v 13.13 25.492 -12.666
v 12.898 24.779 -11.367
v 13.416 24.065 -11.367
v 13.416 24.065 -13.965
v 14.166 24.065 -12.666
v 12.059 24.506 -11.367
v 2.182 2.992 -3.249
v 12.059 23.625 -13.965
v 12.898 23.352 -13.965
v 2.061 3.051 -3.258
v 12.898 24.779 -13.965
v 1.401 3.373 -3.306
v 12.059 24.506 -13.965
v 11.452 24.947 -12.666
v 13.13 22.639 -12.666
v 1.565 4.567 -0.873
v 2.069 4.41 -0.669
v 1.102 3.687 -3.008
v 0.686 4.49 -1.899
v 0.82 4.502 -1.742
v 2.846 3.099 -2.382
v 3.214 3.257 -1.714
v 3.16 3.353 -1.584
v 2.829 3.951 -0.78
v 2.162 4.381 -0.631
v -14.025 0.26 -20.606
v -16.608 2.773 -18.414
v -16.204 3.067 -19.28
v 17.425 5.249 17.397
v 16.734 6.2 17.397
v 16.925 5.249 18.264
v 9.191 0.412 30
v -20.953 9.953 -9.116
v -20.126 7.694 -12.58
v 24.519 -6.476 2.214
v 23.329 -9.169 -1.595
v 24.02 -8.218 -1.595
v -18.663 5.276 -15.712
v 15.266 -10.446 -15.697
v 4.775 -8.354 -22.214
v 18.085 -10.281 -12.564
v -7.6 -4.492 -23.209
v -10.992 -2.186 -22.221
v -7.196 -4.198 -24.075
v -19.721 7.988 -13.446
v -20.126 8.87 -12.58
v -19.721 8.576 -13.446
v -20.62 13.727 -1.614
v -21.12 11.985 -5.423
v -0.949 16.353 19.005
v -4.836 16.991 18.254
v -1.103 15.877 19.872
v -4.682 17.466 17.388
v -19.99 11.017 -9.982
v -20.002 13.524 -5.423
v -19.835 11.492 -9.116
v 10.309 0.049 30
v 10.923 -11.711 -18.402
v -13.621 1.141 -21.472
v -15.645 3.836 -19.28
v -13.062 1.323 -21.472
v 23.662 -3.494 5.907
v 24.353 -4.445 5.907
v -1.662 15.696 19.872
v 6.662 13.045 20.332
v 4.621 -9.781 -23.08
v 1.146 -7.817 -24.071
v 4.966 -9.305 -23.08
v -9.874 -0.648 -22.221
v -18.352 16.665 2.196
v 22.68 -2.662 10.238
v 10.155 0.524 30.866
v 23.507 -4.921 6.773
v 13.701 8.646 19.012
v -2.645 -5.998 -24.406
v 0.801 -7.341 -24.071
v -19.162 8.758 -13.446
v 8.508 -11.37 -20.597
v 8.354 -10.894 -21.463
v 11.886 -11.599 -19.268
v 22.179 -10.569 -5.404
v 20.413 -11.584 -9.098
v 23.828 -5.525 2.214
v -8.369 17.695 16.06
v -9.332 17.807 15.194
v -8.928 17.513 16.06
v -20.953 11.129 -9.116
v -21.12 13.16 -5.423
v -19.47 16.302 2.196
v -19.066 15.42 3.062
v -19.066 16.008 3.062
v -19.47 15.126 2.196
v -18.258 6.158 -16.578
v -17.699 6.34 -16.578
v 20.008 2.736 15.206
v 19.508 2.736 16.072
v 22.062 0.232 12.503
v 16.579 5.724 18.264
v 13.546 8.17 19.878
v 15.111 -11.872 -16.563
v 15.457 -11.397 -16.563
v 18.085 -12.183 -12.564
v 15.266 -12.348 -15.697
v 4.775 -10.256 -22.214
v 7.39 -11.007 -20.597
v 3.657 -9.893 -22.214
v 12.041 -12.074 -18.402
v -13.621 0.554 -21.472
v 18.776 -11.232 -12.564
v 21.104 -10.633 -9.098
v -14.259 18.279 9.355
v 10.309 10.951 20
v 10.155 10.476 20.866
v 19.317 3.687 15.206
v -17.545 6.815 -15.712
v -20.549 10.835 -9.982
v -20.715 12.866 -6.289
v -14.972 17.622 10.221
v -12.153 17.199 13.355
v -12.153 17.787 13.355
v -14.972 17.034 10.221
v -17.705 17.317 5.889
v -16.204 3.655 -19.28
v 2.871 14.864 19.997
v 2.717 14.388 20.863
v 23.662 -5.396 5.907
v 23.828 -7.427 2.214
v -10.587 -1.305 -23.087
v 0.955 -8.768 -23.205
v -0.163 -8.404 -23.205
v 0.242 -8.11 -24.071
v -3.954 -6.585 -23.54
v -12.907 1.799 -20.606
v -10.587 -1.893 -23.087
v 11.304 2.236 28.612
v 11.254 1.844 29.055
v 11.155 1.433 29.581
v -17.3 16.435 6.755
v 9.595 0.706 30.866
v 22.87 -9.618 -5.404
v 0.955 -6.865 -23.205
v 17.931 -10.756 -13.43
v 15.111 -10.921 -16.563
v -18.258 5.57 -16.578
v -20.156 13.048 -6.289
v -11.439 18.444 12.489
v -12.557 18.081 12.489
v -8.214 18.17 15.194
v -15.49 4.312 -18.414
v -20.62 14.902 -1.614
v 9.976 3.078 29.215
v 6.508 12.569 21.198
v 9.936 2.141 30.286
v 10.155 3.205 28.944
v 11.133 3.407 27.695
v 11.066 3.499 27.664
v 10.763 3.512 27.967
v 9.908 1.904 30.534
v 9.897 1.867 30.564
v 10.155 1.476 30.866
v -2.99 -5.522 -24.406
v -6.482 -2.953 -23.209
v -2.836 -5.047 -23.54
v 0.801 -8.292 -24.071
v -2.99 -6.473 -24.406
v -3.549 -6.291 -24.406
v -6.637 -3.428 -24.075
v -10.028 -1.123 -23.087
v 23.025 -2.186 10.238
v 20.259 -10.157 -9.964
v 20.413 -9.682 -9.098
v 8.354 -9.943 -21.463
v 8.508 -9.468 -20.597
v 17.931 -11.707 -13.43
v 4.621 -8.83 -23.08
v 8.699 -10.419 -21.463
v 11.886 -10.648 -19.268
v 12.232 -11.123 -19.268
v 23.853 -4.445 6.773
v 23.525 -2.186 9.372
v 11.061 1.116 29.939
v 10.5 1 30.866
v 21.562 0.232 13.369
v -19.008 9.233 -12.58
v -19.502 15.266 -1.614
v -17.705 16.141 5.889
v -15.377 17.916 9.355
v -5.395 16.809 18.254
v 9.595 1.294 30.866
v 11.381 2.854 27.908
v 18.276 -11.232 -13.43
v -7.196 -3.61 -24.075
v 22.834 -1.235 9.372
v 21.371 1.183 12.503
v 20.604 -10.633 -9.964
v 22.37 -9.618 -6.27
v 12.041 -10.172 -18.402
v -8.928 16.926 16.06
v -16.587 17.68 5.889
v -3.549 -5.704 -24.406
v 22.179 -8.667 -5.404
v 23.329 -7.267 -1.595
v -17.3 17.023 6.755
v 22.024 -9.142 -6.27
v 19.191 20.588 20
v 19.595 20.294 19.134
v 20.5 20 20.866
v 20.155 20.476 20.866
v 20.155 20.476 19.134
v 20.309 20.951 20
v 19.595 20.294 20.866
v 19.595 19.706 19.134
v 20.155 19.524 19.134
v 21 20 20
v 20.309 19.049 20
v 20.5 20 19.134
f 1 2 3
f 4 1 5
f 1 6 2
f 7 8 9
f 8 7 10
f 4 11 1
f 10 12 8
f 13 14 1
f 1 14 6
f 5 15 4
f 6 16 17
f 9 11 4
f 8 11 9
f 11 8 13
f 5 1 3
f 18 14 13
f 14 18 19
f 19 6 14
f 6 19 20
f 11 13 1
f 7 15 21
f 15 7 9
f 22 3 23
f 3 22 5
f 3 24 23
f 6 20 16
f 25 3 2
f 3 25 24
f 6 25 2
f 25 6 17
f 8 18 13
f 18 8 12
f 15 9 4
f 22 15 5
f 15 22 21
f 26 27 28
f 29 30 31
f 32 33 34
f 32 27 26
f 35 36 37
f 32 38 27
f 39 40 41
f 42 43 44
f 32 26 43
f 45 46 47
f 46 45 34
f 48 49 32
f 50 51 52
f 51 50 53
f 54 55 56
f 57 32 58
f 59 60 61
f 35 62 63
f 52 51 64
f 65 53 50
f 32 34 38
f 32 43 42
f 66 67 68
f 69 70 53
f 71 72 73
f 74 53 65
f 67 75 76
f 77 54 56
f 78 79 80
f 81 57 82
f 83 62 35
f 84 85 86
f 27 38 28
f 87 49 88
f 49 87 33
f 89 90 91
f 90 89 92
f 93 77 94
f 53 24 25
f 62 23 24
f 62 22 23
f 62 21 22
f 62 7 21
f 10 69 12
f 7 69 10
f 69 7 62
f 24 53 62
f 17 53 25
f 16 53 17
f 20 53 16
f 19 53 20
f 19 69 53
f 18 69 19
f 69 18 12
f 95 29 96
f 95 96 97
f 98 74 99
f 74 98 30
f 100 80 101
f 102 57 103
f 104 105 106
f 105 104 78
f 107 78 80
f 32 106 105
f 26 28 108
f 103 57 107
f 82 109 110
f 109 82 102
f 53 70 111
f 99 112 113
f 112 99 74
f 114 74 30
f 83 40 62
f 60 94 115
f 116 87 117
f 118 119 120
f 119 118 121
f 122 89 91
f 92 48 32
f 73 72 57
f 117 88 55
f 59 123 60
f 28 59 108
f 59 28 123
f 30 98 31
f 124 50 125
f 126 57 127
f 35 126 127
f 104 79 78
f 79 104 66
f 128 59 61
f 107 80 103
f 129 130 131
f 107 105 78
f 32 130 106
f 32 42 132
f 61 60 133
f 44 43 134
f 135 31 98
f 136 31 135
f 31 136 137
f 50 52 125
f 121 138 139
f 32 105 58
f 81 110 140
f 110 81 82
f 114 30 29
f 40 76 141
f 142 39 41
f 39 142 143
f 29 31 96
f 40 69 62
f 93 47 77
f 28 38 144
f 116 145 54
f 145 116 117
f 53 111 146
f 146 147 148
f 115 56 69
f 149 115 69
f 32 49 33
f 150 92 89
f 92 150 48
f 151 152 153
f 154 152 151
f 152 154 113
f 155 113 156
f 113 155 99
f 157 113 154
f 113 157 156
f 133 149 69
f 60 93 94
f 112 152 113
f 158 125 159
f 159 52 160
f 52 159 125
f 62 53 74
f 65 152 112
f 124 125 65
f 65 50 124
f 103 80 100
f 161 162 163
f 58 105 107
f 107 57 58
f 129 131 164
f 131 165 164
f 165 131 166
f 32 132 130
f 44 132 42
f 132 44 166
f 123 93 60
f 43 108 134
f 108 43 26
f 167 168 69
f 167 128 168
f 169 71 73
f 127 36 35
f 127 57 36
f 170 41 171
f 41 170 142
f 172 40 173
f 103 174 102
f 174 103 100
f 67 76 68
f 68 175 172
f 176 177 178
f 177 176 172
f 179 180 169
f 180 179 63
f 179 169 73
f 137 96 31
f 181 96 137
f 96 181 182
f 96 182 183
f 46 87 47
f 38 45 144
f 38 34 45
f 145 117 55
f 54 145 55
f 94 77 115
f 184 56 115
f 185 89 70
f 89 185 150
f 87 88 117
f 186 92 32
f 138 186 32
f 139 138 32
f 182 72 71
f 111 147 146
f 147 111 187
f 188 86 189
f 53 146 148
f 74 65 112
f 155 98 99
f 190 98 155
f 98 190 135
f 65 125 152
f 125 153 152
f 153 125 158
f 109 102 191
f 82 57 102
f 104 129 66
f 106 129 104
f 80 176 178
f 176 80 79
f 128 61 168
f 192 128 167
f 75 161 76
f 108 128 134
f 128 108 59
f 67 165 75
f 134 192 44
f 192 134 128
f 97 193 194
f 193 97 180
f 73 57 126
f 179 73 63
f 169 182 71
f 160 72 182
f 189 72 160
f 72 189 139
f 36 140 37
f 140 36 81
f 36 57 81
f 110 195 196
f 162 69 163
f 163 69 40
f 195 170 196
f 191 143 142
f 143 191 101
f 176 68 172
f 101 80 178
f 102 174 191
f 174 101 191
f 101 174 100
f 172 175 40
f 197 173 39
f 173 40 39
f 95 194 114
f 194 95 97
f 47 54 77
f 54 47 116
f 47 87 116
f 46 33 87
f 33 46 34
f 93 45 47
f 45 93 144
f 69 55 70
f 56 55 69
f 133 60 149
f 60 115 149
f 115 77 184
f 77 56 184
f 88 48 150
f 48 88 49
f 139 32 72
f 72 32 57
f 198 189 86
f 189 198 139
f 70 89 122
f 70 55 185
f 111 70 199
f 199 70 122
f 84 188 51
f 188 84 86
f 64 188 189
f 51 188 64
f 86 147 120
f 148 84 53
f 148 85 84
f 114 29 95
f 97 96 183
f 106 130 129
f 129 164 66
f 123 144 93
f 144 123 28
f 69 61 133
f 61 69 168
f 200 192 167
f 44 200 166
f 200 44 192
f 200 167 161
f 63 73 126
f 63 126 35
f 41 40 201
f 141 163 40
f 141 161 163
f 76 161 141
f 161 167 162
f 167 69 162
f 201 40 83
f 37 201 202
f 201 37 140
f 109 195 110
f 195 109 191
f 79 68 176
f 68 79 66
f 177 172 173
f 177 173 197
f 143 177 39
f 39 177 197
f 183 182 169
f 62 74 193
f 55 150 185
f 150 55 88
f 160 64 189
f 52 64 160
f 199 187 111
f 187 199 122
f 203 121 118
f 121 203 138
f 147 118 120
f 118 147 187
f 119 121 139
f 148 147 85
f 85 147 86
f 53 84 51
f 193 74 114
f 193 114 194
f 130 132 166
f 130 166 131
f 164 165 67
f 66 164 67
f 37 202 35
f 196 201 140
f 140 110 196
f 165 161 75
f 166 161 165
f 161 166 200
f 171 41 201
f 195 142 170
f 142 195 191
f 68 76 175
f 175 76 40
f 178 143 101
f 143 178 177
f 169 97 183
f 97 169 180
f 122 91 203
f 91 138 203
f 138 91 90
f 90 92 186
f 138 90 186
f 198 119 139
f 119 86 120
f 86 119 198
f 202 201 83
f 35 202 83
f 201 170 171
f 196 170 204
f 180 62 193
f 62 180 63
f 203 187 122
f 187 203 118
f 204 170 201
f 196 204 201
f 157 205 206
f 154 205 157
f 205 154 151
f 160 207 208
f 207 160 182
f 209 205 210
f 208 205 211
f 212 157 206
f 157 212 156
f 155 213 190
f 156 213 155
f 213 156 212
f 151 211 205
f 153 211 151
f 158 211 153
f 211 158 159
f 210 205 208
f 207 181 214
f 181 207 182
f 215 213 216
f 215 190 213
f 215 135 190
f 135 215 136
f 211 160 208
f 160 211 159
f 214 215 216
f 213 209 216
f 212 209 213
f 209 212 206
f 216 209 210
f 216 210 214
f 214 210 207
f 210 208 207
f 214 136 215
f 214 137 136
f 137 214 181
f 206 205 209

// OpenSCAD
     function basis_rot_axis(a_point,b_point)=
     let(norm_p=norm(b_point-a_point))
     [(b_point.x-a_point.x)/norm_p,
     (b_point.y-a_point.y)/norm_p,
     ((b_point.z-a_point.z)/norm_p)];    
 function rot_rnd_axis(a_point,b_point,angle,v)=
     let (n=basis_rot_axis(a_point,b_point))
     let (r=[
  [cos(angle)-pow(n.x,2)*(cos(angle)-1),
  -sin(angle)*n.z-n.x*n.y*(cos(angle)-1),
  sin(angle)*n.y-n.x*n.z*(cos(angle)-1)],
 
  [sin(angle)*n.z-n.x*n.y*(cos(angle)-1),
   cos(angle)-pow(n.y,2)*(cos(angle)-1),
   -sin(angle)*n.x-n.y*n.z*(cos(angle)-1)],
   
   [-sin(angle)*n.y-n.x*n.z*(cos(angle)-1),
    sin(angle)*n.x-n.y*n.z*(cos(angle)-1),
    cos(angle)-pow(n.z,2)*(cos(angle)-1)]
  ]
   *[v.x,v.y,v.z]
   )
   [r.x,r.y,r.z];
   
p1=[10,1,30];
p2=[20,20,20];
v=[10,10,20];
n_vector=basis_rot_axis(p1,p2);
echo(n_vector);
color("red")
hull(){  
    translate(30*n_vector)
    sphere(1.5);
    translate([0,0,0])
    sphere(1.5);
    }
hull(){
for (i=[0:10:360])   
translate(rot_rnd_axis(p1,p2,i,v))
    sphere(1);
translate(p1)
sphere(1);
}
color("green")
hull(){
translate(p1)
    sphere(1);
translate(p2)
    sphere(1);    
    }
hull(){
    translate(v)
    sphere(1);
    translate(p1)
    sphere(1);
    }   
    
